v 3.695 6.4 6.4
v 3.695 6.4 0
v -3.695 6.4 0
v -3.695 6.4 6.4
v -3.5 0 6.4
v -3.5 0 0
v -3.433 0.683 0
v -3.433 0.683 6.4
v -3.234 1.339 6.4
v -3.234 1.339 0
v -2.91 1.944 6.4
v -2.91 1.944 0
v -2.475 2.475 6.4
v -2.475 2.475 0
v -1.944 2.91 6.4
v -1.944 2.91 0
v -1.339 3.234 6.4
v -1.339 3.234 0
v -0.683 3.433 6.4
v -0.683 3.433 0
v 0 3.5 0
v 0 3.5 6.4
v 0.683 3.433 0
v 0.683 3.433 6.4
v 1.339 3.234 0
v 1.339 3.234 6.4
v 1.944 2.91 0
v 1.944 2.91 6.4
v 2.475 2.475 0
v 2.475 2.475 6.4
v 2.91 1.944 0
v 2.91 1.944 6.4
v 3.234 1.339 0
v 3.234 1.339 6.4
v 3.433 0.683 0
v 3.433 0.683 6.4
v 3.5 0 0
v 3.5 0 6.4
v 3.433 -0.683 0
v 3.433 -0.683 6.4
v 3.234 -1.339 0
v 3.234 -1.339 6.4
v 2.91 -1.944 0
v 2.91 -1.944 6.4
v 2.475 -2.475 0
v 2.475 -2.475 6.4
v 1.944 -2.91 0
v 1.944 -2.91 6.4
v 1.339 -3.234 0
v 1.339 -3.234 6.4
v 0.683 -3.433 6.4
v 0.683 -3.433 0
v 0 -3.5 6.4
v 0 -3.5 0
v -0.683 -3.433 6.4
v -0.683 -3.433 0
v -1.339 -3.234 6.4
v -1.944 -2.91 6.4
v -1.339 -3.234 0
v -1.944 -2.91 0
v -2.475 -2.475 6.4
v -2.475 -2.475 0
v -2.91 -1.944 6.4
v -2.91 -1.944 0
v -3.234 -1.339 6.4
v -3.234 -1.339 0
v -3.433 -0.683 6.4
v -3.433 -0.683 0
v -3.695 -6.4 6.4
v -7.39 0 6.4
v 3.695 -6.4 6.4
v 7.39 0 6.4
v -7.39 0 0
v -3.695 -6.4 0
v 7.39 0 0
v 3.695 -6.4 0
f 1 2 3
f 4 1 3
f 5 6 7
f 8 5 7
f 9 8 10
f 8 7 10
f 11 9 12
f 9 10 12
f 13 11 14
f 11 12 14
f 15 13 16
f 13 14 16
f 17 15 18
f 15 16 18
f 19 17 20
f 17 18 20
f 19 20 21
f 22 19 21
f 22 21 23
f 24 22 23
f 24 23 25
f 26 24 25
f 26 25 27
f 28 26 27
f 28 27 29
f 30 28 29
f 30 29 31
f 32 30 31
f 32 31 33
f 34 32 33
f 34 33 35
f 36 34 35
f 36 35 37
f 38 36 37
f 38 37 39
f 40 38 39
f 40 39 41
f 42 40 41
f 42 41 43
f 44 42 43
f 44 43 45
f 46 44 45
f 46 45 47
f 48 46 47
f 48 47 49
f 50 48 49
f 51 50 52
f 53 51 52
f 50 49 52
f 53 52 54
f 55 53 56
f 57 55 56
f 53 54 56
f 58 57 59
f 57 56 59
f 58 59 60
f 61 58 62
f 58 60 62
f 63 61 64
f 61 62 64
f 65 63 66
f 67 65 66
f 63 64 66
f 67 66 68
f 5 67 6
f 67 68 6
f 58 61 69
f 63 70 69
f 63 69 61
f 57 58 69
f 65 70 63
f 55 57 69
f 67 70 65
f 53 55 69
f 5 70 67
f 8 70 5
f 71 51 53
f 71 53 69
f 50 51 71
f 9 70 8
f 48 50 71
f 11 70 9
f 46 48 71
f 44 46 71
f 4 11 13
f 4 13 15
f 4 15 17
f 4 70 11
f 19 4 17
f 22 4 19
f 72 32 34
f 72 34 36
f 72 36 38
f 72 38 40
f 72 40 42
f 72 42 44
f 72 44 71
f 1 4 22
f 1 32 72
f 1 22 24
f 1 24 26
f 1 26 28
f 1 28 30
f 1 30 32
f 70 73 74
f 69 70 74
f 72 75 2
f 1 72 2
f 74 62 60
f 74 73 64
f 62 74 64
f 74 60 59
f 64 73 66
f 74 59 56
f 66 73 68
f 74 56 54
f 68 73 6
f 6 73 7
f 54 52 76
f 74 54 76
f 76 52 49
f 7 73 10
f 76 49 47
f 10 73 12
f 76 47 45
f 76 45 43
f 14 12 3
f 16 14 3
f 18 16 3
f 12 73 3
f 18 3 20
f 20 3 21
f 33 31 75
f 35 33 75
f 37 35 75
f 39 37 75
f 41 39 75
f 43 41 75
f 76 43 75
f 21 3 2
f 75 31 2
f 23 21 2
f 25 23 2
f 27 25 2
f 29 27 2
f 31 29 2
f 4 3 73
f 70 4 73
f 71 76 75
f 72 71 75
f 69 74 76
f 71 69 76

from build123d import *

# Parameters (mm, degrees)
EXTRUDE1_DEPTH        = 6.4
M8X1_0_TAPPED_HOLE1_D = 7


with BuildPart() as part:
    # Sketch1 → Extrude1 (new body)
    with BuildSketch(Plane.XY):
        Polygon((7.390083446, 0), (3.695041723, 6.4), (-3.695041723, 6.4), (-7.390083446, 0), (-3.695041723, -6.4), (3.695041723, -6.4), align=None)
    extrude(amount=EXTRUDE1_DEPTH)

    # M8x1.0 Tapped Hole1 (through all)
    with Locations(Plane.XY.offset(6.4)):
        with Locations((0, 0)):
            Hole(M8X1_0_TAPPED_HOLE1_D / 2)


solid = part.part
